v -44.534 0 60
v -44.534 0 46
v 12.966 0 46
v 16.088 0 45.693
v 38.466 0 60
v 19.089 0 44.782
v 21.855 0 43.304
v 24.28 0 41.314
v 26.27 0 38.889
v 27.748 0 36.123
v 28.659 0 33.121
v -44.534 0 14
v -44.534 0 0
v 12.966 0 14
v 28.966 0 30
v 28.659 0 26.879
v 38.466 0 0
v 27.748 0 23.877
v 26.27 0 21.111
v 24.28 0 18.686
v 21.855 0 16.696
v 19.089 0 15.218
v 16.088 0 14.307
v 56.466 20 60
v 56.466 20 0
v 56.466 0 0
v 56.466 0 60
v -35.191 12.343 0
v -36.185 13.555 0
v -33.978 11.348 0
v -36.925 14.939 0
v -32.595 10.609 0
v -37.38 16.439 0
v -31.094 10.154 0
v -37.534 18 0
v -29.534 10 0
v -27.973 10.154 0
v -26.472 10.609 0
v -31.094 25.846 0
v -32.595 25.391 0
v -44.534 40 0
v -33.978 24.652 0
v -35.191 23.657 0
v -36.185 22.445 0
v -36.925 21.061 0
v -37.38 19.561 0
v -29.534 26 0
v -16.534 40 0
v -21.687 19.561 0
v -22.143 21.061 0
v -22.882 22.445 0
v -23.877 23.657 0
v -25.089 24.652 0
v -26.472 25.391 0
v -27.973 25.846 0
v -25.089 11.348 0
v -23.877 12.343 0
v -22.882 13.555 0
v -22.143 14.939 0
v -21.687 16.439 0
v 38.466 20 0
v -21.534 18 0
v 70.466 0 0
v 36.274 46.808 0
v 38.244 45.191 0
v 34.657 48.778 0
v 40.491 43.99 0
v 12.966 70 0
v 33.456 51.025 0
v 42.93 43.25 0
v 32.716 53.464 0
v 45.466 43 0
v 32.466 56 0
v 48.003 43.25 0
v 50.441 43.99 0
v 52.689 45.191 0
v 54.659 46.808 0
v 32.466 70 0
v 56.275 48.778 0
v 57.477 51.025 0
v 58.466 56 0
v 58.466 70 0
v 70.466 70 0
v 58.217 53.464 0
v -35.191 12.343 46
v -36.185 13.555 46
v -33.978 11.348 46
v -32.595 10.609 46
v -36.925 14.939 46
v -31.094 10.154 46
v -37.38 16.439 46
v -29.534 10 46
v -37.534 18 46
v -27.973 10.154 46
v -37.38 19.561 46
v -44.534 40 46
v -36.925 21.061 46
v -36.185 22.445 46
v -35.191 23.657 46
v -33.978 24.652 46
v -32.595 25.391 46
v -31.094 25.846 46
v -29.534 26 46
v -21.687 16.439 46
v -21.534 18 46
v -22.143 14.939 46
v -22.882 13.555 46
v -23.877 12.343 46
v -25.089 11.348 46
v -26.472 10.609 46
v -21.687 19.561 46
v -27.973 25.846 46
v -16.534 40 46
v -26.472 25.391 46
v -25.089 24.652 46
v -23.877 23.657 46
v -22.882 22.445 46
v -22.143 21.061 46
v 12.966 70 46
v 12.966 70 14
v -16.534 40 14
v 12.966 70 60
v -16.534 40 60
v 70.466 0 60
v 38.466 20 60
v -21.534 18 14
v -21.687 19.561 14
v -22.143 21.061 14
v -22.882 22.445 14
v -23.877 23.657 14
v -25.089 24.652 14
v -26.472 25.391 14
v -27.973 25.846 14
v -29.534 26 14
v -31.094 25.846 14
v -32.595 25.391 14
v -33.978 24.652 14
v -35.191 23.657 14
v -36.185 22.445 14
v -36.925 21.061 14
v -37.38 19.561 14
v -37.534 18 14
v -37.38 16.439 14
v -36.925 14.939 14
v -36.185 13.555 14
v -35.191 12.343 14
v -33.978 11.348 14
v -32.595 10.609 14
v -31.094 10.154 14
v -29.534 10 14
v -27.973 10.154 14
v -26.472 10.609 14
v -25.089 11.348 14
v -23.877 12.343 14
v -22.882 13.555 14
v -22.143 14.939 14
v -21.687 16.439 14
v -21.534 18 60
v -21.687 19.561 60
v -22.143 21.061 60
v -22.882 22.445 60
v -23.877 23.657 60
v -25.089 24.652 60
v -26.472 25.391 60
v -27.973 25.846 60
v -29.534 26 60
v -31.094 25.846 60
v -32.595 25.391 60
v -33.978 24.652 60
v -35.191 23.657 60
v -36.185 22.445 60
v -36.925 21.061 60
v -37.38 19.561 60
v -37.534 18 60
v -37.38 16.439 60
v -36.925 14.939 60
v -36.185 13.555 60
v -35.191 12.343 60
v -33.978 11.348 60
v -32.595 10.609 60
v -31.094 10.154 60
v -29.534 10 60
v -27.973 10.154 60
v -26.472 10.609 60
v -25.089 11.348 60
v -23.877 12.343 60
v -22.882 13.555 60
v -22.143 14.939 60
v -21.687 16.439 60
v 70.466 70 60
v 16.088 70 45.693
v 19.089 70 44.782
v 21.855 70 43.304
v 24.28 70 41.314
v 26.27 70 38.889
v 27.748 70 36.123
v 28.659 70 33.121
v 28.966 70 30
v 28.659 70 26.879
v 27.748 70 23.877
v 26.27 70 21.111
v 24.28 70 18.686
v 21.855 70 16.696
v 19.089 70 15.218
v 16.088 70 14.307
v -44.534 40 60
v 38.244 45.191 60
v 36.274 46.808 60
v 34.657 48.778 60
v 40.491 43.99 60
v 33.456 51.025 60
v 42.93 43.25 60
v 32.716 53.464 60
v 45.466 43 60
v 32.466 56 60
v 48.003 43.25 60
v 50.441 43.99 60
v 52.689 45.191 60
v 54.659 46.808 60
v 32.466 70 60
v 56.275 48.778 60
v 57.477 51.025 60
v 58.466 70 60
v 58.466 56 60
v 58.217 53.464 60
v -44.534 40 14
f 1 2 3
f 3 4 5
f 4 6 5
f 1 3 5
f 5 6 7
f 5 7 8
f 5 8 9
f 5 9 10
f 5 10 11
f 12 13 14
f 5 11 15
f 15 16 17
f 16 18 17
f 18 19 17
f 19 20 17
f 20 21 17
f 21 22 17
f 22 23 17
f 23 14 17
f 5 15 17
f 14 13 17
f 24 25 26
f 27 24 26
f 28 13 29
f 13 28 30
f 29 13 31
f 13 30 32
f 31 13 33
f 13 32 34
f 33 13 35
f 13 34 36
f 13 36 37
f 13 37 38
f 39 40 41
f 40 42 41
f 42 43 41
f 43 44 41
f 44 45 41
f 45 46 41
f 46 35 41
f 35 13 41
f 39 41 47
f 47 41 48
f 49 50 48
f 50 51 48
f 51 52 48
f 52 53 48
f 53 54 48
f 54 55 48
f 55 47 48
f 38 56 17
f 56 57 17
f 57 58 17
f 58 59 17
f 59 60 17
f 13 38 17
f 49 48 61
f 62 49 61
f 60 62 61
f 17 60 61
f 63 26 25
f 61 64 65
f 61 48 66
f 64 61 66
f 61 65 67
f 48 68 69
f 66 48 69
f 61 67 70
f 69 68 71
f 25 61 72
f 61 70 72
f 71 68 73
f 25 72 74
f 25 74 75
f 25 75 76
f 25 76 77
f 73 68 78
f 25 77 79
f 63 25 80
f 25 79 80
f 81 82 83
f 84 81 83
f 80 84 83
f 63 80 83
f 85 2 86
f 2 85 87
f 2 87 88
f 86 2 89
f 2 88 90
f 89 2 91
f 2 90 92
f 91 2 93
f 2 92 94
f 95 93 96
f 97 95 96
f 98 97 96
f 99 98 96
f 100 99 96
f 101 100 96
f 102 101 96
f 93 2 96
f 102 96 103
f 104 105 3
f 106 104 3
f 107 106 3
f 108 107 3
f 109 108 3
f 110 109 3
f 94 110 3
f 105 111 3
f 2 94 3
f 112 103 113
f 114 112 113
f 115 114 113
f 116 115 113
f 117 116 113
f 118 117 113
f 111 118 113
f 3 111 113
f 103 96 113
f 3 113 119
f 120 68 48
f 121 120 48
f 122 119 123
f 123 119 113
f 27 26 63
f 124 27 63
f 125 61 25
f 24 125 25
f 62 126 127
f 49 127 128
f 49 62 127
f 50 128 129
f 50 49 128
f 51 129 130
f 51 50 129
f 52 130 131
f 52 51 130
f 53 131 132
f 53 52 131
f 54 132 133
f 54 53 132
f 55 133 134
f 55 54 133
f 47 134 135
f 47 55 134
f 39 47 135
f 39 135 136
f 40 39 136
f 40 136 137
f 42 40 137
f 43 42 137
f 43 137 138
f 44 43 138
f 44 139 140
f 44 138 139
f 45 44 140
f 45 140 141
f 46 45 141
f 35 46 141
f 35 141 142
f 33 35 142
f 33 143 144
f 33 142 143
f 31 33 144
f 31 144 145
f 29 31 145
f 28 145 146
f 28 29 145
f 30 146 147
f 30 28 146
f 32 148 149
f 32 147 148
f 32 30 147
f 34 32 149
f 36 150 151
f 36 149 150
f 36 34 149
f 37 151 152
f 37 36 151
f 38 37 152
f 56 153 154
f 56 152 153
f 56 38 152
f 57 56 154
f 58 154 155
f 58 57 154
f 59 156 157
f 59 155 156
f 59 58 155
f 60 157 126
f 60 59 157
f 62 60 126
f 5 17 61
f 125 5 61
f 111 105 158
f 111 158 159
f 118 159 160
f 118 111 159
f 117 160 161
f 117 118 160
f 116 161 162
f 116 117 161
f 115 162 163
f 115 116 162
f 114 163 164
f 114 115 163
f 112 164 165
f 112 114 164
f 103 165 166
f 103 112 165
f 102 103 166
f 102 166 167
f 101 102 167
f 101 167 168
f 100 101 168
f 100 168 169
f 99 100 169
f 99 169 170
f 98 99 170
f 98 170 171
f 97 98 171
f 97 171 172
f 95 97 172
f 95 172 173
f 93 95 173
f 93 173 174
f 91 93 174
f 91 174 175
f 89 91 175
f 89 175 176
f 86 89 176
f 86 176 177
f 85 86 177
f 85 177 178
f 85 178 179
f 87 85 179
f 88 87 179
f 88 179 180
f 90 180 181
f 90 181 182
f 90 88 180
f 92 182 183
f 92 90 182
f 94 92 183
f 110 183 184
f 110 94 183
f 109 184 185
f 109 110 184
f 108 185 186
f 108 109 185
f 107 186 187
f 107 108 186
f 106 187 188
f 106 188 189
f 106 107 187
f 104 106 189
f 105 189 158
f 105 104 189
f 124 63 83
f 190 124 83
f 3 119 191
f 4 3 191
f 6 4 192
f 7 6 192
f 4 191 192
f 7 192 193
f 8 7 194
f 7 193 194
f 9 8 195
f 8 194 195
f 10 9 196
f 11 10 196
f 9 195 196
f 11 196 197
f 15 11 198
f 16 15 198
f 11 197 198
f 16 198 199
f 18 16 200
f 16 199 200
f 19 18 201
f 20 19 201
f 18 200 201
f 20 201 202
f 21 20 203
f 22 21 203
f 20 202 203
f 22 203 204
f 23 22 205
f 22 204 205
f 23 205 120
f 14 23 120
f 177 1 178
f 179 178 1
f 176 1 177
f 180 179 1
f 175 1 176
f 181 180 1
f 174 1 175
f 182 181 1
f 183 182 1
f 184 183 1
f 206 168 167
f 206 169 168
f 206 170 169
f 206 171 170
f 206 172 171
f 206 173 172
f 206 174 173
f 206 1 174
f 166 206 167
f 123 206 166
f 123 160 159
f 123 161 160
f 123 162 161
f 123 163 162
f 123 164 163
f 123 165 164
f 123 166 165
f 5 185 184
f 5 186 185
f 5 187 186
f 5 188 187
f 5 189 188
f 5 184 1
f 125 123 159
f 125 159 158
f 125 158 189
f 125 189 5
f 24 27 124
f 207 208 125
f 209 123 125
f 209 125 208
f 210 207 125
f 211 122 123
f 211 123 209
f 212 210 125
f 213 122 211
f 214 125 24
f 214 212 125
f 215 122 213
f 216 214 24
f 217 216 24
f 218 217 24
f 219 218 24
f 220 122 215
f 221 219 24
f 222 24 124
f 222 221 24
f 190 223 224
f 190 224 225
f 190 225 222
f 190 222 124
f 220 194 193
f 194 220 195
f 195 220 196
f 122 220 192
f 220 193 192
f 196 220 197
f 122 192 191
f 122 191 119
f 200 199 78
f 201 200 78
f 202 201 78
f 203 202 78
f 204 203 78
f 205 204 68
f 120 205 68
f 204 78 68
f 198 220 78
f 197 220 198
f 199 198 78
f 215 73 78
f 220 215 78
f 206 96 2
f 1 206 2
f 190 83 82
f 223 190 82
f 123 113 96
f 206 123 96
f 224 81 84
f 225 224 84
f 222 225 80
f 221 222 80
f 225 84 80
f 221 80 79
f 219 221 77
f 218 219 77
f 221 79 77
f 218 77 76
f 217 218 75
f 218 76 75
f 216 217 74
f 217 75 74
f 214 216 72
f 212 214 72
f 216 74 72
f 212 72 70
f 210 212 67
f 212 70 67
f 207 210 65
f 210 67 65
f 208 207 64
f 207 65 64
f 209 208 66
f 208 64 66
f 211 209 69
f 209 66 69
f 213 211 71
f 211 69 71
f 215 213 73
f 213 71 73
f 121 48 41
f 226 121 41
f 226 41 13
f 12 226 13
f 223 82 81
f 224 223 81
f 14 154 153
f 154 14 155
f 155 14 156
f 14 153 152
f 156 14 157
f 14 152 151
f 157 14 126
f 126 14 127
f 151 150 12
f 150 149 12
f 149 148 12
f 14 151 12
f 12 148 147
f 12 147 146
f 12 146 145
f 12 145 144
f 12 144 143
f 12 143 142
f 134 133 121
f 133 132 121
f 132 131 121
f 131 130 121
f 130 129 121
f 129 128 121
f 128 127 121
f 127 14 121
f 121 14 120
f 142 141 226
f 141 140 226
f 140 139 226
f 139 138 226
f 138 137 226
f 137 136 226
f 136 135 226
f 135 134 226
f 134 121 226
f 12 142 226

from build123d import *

# Parameters (mm, degrees)
SKETCH1_R           = 8
BOSS_EXTRUDE1_DEPTH = 60
CUT_EXTRUDE1_DEPTH  = 117.040965384


with BuildPart() as part:
    # Sketch1 → Boss-Extrude1 (new body)
    # profile 1 of 2: a face of its own
    with BuildSketch(Plane.XY):
        with BuildLine():
            Line((12.966344075, 70), (12.966344075, 0))
            Line((12.966344075, 0), (38.466344075, 0))
            Line((38.466344075, 0), (38.466344075, 20))
            Line((38.466344075, 20), (56.466344075, 20))
            Line((56.466344075, 20), (56.466344075, 0))
            Line((56.466344075, 0), (70.466344075, 0))
            Line((70.466344075, 0), (70.466344075, 70))
            Line((70.466344075, 70), (58.466344075, 70))
            Line((58.466344075, 70), (58.466344075, 56))
            ThreePointArc((58.466344075, 56), (45.466344075, 43), (32.466344075, 56))
            Line((32.466344075, 56), (32.466344075, 70))
            Line((32.466344075, 70), (12.966344075, 70))
        make_face()
    # profile 2 of 2: a face of its own
    with BuildSketch(Plane.XY):
        Polygon((-44.533655925, 0), (0, 0), (12.966344075, 0), (12.966344075, 70), (-16.533655925, 40), (-44.533655925, 40), align=None)
        with Locations((-29.533655925, 18)):
            Circle(SKETCH1_R, mode=Mode.SUBTRACT)
    extrude(amount=BOSS_EXTRUDE1_DEPTH)

    # Sketch2 → Cut-Extrude1 (cut, through all)
    with BuildSketch(Plane(origin=(0, 70, 0), x_dir=(1, 0, 0), z_dir=(0, 1, 0))):
        with BuildLine():
            Line((12.966344075, -14), (-56.308501396, -14))
            Line((-56.308501396, -14), (-56.308501396, -46))
            Line((-56.308501396, -46), (12.966344075, -46))
            ThreePointArc((12.966344075, -46), (28.966344075, -30), (12.966344075, -14))
        make_face()
    extrude(amount=-CUT_EXTRUDE1_DEPTH, mode=Mode.SUBTRACT)


solid = part.part
